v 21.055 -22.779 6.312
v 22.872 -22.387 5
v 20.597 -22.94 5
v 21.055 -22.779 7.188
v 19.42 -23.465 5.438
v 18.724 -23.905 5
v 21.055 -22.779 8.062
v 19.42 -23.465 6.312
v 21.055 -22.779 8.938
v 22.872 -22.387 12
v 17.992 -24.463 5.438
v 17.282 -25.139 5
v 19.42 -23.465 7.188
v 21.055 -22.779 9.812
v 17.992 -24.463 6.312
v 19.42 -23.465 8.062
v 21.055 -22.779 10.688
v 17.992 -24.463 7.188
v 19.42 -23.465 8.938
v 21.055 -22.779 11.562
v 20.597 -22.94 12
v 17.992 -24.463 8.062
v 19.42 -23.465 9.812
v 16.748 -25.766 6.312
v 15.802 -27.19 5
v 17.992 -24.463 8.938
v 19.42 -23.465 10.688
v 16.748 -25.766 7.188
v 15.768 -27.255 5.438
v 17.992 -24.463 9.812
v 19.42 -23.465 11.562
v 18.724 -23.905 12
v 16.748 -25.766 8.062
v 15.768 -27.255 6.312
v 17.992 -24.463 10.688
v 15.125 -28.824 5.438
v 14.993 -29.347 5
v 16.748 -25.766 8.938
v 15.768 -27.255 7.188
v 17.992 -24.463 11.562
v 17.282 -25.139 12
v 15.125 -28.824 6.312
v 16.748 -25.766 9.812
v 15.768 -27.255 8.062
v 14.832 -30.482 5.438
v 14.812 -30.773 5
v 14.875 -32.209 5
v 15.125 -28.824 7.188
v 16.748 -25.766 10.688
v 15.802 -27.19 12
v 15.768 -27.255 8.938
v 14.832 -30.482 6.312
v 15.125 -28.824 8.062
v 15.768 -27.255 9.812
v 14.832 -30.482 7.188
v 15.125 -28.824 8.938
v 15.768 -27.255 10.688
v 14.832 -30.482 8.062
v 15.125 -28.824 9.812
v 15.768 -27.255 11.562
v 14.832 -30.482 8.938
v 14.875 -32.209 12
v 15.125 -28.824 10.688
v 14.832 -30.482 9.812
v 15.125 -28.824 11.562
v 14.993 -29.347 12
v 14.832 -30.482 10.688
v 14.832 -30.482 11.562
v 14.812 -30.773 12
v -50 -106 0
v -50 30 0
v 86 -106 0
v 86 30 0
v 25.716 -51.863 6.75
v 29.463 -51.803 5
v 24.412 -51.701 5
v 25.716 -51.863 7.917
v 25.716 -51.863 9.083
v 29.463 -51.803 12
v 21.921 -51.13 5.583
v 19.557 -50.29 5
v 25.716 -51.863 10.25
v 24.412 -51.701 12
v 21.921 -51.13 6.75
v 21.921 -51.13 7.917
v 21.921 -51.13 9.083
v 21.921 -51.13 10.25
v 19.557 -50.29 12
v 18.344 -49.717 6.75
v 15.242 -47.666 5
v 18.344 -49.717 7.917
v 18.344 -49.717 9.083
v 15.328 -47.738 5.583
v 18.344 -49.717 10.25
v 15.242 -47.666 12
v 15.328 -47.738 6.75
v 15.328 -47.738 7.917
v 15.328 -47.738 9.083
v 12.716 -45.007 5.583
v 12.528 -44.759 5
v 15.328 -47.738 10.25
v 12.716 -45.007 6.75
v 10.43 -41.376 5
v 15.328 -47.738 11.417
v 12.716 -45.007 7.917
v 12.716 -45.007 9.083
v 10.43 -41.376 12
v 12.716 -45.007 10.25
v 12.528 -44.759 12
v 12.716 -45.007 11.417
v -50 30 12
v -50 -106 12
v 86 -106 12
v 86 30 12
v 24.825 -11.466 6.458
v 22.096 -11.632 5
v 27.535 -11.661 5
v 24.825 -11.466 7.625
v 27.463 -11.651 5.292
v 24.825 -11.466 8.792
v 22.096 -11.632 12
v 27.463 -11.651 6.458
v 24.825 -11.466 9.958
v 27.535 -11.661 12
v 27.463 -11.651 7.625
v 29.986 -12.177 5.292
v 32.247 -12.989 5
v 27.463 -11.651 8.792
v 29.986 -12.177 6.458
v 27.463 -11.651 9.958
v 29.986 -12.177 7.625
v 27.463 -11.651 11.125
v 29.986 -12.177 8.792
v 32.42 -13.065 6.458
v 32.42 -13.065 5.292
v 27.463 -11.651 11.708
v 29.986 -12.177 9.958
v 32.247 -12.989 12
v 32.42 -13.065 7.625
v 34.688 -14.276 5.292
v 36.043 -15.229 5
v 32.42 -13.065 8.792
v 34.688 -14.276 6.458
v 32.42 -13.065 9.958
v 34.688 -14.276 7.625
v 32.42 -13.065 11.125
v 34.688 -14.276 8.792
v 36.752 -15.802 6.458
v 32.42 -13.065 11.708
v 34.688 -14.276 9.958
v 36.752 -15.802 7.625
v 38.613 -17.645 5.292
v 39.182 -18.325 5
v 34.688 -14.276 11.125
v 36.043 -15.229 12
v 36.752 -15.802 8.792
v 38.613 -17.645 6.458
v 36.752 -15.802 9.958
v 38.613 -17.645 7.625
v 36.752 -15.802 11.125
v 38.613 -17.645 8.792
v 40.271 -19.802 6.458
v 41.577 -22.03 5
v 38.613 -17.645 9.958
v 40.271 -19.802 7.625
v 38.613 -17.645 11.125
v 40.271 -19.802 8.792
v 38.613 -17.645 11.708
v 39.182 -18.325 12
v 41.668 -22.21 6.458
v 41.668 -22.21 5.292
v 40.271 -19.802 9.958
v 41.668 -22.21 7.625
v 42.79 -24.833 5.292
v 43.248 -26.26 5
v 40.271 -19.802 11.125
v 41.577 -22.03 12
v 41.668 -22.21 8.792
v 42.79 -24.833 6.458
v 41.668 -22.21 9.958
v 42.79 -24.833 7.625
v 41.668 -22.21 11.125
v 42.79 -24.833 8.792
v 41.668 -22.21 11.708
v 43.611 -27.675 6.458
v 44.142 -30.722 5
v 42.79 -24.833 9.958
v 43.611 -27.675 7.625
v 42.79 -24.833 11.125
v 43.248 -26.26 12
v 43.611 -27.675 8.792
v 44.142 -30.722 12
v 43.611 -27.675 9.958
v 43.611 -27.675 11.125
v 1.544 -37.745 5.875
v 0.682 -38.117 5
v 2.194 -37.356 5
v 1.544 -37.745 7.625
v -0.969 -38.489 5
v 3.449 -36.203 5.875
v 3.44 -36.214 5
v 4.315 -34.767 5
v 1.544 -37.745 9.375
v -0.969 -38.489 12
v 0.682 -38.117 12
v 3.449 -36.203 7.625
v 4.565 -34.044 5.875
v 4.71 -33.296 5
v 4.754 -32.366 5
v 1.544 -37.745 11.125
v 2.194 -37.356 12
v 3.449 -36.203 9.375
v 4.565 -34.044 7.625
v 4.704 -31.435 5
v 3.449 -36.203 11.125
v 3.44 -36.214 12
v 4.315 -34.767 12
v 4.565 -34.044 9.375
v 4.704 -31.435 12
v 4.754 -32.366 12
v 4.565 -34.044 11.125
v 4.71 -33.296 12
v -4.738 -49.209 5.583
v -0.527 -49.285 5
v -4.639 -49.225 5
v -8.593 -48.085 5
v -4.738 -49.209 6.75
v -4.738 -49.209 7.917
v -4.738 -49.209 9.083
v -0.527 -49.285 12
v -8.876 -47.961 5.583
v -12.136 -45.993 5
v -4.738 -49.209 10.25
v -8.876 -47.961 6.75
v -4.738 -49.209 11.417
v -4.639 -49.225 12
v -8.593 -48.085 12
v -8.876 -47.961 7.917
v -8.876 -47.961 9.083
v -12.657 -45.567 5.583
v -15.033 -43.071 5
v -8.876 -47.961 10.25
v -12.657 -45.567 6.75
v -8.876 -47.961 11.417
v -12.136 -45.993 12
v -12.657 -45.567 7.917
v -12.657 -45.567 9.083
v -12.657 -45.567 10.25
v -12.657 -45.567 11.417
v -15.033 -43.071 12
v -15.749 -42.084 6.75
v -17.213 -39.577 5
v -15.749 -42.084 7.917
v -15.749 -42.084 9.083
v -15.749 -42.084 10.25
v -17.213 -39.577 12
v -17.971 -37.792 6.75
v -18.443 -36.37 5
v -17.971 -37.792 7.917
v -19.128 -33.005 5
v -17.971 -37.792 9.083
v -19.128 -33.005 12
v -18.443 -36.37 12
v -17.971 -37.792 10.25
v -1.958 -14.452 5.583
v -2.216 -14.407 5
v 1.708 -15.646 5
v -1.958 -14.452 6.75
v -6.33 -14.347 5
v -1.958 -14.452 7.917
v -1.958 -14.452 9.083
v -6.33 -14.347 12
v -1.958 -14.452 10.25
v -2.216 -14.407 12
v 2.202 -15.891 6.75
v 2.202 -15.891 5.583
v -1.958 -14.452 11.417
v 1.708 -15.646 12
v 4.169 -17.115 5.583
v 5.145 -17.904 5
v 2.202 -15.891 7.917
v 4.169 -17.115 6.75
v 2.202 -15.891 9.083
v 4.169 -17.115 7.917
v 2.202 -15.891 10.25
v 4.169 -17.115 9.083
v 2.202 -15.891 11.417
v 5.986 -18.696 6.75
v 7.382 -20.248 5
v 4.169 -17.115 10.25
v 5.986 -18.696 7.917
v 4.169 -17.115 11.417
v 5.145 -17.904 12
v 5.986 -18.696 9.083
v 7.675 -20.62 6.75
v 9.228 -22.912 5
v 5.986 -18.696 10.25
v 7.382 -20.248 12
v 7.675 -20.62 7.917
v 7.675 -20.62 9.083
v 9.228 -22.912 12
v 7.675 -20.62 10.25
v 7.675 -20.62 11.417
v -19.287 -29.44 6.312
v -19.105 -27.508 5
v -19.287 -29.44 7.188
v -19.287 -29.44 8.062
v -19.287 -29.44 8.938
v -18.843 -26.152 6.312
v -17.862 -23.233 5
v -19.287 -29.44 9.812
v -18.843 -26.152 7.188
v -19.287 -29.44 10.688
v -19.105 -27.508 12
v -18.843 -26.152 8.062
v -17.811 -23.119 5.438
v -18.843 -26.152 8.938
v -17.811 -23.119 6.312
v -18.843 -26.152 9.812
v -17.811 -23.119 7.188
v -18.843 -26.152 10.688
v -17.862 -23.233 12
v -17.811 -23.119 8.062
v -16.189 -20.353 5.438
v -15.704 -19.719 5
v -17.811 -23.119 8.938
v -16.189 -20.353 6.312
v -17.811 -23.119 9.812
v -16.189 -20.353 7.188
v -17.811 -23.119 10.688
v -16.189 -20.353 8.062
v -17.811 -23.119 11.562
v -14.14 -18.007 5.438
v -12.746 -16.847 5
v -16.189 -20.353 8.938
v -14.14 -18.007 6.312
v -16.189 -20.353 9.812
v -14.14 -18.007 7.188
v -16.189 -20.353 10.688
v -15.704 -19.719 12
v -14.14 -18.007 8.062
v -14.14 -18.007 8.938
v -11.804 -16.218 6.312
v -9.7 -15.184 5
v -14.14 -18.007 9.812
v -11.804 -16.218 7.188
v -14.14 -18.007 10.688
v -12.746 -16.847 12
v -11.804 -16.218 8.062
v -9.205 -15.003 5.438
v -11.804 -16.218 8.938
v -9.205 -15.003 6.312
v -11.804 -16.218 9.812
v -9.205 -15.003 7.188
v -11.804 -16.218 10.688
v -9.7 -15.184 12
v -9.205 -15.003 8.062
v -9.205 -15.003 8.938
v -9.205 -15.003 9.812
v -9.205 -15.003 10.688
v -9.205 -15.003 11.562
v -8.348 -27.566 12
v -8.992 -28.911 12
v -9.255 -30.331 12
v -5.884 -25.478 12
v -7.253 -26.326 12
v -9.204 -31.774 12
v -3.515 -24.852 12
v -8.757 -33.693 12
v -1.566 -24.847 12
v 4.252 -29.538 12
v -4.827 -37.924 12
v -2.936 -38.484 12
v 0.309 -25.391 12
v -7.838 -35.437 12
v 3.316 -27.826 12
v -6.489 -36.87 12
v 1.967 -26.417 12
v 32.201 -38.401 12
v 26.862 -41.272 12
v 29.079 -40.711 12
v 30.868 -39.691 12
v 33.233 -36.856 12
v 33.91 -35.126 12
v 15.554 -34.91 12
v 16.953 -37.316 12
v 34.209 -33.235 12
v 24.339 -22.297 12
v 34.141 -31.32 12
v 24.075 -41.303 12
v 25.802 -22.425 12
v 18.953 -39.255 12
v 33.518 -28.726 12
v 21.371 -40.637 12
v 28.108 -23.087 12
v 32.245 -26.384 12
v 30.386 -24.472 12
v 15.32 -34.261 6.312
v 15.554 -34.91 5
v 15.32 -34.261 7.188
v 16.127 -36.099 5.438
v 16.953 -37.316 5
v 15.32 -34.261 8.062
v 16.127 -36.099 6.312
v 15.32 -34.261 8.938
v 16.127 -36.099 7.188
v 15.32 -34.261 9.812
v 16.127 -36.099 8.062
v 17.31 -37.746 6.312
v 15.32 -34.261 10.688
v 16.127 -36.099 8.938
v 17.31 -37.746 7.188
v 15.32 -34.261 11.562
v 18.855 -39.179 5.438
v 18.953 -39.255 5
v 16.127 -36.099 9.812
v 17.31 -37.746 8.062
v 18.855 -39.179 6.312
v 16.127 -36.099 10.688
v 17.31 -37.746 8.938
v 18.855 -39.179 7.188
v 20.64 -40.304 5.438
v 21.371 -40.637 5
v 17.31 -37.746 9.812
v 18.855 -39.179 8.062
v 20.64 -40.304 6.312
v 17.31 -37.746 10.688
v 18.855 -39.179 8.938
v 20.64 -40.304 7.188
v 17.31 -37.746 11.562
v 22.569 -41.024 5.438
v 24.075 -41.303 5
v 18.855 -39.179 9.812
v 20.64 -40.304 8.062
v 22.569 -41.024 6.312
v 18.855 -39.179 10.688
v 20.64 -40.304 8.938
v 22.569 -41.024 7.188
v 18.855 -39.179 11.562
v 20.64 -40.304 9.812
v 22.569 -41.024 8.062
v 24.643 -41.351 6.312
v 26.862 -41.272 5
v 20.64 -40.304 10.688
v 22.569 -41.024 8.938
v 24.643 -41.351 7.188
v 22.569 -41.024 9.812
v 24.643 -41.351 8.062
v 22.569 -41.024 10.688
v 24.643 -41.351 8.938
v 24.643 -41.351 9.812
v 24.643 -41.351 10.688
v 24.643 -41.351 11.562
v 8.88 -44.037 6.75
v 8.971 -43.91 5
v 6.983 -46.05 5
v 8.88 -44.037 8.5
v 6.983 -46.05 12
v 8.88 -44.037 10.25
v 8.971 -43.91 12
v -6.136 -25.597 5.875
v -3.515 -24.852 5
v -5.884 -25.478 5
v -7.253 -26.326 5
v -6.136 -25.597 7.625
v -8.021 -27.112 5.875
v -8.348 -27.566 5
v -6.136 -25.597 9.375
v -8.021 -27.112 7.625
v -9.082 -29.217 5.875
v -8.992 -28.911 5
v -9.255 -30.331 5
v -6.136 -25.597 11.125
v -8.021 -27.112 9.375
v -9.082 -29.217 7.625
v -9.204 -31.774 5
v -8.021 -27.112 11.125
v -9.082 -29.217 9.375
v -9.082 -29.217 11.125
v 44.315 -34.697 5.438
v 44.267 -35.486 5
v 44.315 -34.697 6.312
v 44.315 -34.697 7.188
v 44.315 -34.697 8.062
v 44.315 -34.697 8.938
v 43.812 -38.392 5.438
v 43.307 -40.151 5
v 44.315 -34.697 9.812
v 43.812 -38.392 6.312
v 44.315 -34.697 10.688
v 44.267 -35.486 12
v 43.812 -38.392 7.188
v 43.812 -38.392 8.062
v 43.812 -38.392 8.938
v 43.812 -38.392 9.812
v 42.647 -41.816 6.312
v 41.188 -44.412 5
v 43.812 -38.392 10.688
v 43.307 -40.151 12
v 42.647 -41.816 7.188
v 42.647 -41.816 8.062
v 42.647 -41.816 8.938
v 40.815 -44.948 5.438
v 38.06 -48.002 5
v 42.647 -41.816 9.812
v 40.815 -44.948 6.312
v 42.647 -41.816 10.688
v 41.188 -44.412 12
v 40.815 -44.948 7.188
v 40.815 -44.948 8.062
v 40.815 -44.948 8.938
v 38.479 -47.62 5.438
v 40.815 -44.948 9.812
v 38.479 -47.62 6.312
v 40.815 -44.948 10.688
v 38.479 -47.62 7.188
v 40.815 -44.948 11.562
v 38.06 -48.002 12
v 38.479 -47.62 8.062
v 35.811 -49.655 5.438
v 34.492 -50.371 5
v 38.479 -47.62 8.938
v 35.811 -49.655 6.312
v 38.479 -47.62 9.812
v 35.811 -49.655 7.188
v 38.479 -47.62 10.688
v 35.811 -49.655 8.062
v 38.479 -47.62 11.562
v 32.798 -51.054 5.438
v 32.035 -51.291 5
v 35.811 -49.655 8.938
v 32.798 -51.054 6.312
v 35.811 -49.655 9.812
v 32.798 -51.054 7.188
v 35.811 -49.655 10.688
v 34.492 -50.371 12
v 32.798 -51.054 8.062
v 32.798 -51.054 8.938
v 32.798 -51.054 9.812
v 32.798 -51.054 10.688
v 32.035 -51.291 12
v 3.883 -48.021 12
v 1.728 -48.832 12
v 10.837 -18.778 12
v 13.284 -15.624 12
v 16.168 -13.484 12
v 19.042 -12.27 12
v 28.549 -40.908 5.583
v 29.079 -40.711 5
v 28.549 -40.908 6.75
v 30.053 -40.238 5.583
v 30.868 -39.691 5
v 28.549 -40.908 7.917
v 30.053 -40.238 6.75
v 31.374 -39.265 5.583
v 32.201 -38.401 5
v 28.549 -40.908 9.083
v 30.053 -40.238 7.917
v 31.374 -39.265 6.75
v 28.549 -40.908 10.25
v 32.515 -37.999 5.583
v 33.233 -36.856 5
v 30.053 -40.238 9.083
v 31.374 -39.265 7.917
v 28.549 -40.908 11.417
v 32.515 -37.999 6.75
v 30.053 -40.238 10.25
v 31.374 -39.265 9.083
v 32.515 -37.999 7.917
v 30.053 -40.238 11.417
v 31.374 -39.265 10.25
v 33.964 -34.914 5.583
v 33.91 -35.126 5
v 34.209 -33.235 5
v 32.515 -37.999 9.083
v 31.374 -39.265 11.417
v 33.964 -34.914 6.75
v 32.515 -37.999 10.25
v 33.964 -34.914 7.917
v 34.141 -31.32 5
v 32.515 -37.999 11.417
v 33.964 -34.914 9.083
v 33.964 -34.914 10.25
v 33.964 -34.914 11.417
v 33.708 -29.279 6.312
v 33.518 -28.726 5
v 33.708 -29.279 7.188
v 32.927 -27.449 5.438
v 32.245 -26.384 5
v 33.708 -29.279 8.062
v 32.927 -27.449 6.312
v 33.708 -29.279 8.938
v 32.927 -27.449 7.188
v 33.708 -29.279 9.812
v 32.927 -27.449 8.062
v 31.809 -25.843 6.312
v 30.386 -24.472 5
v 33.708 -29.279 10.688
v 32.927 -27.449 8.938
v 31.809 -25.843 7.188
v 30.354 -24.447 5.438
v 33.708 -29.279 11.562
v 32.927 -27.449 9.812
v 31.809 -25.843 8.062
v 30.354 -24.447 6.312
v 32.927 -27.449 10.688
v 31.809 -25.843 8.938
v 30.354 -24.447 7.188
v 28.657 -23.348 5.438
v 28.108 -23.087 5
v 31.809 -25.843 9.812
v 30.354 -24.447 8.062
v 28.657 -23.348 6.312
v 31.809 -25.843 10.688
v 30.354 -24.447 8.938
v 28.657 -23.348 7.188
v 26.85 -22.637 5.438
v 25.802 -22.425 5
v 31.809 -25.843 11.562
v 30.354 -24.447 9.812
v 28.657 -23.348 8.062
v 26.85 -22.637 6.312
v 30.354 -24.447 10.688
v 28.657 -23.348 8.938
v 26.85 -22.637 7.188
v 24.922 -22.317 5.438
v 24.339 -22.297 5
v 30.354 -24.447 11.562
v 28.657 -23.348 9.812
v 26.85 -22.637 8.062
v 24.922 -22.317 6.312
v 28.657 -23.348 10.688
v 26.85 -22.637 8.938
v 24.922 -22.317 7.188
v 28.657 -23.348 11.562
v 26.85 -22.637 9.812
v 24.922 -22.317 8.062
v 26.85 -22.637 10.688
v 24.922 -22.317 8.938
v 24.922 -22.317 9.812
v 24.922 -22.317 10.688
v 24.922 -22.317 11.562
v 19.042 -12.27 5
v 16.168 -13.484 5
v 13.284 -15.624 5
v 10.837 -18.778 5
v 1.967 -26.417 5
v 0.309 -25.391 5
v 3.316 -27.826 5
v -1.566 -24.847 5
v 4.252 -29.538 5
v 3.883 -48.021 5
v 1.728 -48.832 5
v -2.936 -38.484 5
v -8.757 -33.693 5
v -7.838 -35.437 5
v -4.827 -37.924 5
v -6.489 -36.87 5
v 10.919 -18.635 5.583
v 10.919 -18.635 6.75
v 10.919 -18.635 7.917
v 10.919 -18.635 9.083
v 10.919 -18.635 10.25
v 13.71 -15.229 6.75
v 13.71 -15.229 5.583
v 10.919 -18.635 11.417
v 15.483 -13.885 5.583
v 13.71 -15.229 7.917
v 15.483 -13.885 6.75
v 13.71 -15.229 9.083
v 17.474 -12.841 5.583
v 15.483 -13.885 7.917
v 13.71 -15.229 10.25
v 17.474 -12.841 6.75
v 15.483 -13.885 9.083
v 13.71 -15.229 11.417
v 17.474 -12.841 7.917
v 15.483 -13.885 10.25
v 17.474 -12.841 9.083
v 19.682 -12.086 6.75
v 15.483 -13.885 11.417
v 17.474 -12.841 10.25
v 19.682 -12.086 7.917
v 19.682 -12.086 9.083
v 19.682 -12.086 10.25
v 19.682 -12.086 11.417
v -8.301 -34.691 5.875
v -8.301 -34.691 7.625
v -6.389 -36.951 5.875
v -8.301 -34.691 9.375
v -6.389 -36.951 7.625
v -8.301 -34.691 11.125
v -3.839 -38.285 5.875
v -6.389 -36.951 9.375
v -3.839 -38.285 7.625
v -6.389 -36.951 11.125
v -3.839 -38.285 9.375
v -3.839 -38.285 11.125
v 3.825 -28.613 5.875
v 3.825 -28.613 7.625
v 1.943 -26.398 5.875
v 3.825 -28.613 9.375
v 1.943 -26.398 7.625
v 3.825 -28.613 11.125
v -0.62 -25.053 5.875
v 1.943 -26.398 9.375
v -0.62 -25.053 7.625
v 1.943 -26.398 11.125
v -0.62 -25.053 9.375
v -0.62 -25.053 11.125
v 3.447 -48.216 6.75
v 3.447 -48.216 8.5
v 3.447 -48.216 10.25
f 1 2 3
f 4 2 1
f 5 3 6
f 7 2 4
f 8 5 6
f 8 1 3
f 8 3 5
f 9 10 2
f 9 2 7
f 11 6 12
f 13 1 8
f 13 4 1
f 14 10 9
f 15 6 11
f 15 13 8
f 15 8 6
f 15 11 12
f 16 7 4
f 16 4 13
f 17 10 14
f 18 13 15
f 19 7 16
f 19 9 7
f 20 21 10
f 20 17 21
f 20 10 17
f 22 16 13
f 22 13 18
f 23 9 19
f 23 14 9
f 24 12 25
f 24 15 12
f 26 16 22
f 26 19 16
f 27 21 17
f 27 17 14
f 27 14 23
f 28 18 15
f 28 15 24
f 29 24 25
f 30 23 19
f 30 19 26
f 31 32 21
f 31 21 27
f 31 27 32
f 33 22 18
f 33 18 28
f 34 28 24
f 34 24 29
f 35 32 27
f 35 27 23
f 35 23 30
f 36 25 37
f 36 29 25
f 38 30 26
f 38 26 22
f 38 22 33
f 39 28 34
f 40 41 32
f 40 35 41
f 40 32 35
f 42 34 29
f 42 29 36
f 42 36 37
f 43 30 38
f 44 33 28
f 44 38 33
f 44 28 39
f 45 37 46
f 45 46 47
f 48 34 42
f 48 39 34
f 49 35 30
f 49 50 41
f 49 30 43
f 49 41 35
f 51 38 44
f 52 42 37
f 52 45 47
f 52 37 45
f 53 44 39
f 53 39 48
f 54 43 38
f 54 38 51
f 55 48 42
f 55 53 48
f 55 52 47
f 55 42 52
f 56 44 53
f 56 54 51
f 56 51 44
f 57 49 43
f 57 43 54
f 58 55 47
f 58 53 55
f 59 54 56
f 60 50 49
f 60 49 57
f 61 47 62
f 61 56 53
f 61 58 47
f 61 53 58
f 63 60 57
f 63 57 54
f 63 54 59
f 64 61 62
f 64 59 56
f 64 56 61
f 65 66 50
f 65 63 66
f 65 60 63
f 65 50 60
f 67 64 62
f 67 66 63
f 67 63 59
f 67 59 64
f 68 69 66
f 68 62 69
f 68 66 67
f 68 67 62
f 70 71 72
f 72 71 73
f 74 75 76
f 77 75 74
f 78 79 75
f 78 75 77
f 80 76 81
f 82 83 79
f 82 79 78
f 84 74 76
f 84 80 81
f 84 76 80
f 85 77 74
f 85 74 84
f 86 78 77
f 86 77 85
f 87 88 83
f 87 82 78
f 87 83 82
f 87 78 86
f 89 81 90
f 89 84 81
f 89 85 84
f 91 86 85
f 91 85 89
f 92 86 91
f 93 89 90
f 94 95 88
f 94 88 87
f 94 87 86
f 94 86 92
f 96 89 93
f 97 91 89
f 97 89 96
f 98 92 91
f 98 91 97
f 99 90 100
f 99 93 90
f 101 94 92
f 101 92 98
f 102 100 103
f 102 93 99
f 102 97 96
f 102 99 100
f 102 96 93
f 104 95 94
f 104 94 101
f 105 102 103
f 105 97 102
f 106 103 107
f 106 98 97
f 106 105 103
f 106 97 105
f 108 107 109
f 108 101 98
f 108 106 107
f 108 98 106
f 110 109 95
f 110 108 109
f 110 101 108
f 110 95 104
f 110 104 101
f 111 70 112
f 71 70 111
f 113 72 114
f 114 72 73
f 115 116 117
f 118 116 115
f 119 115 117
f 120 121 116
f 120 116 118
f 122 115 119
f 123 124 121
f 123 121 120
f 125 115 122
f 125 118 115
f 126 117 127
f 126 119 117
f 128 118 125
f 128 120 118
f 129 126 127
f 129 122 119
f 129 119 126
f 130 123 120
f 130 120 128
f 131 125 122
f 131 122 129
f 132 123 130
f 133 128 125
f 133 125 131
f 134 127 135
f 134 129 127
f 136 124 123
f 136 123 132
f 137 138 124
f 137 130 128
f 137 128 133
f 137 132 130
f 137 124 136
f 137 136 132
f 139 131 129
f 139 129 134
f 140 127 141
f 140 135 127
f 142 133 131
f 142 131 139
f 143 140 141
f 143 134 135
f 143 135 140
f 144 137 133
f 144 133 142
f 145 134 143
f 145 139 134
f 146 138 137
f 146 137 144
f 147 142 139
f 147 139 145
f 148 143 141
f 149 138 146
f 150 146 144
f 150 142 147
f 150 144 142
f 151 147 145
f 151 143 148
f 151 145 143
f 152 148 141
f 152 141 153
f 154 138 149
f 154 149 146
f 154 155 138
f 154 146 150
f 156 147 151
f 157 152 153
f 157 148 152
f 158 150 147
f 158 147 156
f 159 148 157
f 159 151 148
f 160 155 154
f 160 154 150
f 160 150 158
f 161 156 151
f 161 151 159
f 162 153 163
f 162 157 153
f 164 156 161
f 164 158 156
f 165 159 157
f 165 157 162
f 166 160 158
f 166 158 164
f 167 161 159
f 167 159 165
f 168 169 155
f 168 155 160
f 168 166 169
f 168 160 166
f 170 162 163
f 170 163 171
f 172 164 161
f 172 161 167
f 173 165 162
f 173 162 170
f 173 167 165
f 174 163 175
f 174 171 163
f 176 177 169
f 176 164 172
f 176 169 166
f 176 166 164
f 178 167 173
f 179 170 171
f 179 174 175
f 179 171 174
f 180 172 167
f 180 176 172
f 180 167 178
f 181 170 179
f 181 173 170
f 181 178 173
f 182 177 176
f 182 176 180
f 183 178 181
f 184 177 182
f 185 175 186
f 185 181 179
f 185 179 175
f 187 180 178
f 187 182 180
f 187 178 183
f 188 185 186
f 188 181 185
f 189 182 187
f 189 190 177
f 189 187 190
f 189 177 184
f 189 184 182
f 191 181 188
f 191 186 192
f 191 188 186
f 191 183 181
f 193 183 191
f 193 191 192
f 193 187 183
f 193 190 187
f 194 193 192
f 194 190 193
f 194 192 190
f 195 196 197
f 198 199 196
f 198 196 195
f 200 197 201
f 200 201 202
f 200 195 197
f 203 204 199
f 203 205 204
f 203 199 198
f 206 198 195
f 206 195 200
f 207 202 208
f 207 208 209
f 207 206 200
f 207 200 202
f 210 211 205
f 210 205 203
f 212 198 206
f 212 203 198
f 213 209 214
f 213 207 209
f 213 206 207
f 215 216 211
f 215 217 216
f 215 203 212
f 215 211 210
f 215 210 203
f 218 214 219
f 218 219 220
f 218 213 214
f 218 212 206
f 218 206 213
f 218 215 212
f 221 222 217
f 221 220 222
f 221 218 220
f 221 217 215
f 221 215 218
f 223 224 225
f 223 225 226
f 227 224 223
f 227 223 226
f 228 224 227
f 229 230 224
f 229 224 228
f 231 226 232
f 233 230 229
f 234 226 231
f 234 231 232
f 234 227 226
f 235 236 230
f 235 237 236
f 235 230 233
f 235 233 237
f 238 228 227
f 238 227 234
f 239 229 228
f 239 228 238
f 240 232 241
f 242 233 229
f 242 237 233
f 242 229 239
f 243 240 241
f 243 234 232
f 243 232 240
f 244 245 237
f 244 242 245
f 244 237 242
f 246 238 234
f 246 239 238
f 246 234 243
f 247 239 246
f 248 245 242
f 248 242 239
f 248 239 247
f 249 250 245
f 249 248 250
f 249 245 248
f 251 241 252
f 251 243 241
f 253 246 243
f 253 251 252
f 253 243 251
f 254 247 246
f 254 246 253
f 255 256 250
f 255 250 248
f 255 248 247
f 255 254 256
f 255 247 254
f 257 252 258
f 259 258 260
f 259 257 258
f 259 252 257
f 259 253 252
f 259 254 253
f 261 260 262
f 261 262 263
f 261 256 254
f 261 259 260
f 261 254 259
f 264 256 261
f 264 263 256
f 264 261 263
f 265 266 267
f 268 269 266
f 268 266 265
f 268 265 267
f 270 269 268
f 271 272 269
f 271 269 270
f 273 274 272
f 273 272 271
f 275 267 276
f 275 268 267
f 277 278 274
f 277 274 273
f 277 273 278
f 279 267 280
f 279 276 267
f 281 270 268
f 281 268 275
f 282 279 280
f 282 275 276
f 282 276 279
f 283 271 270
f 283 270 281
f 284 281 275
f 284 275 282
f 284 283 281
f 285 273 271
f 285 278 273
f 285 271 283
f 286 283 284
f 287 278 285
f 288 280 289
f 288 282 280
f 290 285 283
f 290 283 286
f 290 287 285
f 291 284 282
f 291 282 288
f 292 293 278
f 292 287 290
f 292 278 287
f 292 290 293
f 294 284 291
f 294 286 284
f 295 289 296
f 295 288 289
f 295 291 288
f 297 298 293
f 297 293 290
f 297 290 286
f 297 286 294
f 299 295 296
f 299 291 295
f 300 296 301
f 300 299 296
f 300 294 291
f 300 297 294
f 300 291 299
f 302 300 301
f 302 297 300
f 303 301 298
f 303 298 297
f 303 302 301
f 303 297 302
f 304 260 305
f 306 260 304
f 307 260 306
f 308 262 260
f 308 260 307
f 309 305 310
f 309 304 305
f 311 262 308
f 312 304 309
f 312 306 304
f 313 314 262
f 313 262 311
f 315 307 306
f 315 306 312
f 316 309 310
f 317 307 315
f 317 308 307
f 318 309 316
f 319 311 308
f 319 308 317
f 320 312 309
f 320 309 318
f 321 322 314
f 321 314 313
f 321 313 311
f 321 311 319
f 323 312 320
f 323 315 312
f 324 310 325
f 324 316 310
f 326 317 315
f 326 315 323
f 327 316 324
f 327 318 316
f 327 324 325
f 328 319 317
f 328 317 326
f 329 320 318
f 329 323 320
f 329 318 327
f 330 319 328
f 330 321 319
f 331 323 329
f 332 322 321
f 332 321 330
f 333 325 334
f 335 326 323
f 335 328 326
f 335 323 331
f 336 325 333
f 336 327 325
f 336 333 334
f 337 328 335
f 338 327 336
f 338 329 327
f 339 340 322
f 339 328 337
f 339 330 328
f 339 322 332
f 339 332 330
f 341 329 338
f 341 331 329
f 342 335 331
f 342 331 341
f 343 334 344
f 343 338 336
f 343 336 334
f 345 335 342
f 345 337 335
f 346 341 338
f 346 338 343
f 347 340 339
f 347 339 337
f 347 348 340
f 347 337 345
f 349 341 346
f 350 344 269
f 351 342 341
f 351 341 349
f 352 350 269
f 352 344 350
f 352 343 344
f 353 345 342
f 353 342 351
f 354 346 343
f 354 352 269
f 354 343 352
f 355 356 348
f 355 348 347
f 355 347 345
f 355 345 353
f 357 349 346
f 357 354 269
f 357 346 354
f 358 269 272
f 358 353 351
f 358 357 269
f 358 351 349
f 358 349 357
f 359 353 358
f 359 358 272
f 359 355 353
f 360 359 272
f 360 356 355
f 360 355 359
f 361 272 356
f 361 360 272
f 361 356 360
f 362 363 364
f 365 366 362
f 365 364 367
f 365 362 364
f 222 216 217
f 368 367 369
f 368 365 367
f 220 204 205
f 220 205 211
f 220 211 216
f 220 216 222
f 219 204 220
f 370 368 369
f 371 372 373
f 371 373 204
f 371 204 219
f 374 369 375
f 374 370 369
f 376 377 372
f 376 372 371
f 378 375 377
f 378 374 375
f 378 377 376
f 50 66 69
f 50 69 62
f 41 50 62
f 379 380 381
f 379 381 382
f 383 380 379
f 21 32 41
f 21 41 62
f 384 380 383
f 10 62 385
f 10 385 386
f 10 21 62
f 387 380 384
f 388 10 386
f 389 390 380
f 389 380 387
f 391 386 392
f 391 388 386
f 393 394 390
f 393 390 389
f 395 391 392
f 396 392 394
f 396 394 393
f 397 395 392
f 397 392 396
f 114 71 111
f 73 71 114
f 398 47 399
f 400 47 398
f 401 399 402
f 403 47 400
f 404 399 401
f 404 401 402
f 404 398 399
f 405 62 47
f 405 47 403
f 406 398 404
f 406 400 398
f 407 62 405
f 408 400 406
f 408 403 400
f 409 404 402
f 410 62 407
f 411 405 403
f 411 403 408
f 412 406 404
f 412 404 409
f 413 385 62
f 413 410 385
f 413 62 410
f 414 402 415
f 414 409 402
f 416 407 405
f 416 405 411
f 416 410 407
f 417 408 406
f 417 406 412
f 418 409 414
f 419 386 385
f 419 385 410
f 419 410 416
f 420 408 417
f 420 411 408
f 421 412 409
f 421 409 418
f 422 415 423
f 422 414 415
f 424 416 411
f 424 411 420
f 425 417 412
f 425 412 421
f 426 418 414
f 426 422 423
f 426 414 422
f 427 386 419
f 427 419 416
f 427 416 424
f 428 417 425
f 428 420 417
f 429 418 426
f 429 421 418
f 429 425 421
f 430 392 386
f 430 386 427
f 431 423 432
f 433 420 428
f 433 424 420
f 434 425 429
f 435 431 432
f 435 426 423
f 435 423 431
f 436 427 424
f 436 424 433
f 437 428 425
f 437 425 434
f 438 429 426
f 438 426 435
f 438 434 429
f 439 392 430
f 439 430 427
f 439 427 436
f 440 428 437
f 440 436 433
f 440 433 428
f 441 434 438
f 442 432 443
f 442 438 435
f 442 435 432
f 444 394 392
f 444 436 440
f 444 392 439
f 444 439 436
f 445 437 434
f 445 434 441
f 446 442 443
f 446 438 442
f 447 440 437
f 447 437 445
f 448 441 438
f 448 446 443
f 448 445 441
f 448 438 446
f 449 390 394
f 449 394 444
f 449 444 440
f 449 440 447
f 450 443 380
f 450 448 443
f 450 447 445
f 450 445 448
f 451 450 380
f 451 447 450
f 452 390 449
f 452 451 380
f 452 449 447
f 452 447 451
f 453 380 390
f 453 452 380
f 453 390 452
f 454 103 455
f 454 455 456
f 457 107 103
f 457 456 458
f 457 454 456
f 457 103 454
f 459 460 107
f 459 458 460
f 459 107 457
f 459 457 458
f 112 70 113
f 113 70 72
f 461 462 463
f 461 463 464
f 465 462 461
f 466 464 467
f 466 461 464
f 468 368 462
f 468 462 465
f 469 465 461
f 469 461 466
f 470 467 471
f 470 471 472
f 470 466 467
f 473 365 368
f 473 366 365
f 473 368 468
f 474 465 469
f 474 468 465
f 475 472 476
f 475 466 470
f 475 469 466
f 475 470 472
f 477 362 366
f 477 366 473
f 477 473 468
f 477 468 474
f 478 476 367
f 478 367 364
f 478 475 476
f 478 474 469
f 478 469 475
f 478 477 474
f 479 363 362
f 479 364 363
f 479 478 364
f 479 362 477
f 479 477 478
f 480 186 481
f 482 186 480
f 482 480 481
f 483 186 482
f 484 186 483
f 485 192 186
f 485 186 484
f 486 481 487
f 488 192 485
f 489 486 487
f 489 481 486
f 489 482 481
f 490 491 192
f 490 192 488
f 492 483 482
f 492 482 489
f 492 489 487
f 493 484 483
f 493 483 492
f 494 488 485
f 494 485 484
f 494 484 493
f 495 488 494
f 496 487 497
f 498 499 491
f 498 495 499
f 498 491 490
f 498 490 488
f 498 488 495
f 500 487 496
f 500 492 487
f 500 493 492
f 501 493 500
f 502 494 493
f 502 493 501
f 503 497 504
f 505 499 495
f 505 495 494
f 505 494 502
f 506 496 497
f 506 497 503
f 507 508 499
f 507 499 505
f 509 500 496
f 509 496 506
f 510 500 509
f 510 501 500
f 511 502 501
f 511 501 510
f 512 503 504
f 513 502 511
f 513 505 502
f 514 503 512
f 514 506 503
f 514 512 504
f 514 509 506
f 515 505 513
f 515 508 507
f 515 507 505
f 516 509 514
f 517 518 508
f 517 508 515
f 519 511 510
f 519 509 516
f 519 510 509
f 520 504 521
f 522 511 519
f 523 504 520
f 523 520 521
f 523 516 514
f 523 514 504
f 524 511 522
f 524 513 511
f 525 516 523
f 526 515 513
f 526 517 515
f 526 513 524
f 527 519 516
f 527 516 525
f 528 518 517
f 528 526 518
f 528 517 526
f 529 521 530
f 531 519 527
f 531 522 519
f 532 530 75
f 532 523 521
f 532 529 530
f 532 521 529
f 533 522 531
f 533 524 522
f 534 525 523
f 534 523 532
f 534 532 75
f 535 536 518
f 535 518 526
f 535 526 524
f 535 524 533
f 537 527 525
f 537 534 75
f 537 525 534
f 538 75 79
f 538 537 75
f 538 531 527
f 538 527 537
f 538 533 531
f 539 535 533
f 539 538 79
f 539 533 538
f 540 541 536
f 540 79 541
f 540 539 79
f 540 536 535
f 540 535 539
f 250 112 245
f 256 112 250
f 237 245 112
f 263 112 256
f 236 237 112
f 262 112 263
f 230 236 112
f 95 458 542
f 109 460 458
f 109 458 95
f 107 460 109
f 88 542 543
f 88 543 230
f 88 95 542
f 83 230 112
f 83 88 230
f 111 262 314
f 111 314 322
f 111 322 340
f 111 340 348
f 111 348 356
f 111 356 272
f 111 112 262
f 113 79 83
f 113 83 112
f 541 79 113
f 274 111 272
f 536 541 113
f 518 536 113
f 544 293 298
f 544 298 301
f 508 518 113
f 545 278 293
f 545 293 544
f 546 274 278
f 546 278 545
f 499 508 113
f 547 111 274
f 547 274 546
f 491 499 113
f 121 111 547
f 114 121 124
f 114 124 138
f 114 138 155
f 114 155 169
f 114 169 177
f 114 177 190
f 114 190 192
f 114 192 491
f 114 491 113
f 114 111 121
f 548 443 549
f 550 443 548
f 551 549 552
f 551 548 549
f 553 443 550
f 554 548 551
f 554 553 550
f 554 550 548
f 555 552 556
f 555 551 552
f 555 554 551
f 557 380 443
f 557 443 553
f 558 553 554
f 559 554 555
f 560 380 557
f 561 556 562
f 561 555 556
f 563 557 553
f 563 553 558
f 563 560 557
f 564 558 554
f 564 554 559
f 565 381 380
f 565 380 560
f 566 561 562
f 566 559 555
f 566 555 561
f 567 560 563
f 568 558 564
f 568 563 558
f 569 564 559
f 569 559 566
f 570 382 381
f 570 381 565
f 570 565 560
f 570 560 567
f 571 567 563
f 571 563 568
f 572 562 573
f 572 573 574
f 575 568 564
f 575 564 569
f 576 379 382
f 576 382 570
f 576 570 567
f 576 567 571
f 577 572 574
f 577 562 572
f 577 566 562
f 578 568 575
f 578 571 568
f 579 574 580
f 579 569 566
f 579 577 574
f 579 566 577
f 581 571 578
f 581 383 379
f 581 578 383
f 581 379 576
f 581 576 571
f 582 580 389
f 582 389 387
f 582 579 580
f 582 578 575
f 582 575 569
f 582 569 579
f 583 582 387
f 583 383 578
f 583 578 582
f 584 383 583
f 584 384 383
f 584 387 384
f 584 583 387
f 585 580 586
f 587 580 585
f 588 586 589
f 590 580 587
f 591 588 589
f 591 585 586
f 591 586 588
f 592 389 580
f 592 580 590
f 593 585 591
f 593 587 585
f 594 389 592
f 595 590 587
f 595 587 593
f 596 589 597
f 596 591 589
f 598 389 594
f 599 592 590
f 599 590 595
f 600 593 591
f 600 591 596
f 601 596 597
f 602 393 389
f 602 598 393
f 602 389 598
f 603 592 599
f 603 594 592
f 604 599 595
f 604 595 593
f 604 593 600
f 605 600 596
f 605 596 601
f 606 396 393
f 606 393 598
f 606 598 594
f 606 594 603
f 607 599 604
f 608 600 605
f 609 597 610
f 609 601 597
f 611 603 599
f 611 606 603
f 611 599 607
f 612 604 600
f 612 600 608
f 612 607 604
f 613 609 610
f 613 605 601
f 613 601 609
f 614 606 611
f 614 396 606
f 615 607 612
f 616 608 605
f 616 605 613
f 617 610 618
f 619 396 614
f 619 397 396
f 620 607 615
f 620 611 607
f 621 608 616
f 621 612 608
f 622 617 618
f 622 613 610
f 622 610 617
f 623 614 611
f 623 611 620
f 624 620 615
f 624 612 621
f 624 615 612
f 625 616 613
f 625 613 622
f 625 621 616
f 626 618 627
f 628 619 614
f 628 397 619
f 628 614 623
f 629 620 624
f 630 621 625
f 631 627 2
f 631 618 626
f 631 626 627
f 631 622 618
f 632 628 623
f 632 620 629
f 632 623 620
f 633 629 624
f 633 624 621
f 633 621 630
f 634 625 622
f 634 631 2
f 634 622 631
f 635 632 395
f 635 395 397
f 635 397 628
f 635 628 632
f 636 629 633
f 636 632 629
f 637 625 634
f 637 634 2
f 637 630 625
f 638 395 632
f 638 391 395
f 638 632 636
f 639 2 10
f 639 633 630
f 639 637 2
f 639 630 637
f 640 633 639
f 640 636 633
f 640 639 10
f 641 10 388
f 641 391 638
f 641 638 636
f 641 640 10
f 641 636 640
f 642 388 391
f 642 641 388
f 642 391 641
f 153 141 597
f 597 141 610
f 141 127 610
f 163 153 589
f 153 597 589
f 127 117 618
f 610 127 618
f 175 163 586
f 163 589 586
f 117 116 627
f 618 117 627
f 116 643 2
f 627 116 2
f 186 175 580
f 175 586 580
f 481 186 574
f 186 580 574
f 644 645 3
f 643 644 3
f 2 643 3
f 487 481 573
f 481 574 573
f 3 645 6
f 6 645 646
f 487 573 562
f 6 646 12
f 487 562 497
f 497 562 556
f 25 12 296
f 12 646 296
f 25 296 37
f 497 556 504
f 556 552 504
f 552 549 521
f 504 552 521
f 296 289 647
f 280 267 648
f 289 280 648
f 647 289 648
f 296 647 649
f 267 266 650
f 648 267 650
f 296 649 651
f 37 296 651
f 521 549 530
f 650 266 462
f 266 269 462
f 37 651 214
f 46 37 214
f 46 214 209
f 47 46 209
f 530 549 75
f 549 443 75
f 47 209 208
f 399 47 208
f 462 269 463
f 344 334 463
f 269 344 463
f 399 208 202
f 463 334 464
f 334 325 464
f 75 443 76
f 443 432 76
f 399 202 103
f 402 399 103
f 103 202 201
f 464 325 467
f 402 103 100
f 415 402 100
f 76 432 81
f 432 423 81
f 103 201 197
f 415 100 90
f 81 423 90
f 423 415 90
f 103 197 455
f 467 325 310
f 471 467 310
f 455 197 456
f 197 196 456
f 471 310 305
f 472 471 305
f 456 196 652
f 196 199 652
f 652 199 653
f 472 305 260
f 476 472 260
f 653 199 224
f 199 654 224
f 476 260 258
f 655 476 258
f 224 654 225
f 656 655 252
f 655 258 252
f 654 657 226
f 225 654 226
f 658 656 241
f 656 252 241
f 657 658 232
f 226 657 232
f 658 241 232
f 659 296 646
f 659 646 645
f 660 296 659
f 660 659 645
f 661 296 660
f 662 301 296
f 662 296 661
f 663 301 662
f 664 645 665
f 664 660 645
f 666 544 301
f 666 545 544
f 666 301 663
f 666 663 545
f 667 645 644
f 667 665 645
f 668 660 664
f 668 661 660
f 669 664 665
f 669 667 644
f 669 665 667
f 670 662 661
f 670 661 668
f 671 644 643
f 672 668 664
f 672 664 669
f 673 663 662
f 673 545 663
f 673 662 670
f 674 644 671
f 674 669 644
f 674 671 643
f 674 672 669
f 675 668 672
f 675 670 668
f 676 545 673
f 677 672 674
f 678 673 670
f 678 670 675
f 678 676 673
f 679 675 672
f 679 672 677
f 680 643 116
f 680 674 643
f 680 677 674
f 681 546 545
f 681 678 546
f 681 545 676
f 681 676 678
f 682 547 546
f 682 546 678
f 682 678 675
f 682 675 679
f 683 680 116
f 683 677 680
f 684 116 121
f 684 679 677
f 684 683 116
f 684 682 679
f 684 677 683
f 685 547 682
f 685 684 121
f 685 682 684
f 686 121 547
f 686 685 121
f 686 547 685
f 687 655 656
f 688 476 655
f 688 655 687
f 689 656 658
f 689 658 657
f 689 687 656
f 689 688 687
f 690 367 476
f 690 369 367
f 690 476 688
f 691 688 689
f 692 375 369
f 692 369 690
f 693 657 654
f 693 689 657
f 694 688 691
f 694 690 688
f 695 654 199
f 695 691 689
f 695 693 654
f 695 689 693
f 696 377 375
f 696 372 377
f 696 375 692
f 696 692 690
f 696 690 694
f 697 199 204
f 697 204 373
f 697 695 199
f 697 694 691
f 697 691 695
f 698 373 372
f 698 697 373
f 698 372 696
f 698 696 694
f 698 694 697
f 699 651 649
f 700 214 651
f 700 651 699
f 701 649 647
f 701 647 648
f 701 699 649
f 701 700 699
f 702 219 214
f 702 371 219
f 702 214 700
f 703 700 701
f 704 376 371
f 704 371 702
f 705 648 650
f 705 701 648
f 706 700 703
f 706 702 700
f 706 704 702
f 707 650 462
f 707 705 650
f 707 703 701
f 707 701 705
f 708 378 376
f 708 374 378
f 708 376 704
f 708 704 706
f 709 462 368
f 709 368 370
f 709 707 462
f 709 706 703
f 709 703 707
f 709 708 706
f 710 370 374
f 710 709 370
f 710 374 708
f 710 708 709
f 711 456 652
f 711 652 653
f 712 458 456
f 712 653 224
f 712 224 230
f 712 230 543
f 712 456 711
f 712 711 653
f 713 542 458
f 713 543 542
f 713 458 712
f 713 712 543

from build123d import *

# Parameters (mm, degrees)
SKIZZE1_W                       = 136
SKIZZE1_H                       = 136
AUFSATZ_LINEAR_AUSTRAGEN1_DEPTH = 12
SCHNITT_LINEAR_AUSTRAGEN2_DEPTH = 7


with BuildPart() as part:
    # Skizze1 → Aufsatz-Linear austragen1 (new body)
    with BuildSketch(Plane.XY):
        with Locations((18, -38)):
            Rectangle(SKIZZE1_W, SKIZZE1_H)
    extrude(amount=AUFSATZ_LINEAR_AUSTRAGEN1_DEPTH)

    # Skizze2 → Schnitt-Linear austragen2 (cut)
    with BuildSketch(Plane(origin=(31.817178146, 33.536064215, 12), x_dir=(-0.121869343, 0.992546152, 0), z_dir=(0, 0, 1))):
        with BuildLine():
            add(Edge.make_bspline(
                [(-53.274003062, 29.299786841), (-52.549854037, 28.997029862), (-51.129325688, 28.403126042), (-49.217358679, 27.153857855), (-47.540898563, 25.676342761), (-46.383253592, 24.230129356), (-45.579392411, 22.986547621), (-45.060203572, 21.996870887), (-44.632569988, 20.959918203), (-44.264434, 19.886493576), (-43.993212362, 18.762770223), (-43.787214797, 17.599258828), (-43.663882177, 16.389802125), (-43.652426375, 15.570103704), (-43.646599216, 15.153152225)],
                knots=[0, 0, 0, 0, 1.541464985, 3.0238178, 4.469784276, 5.921154489, 6.651437481, 7.38125241, 8.116115087, 8.856410813, 9.611538438, 10.387763072, 11.179912327, 12, 12, 12, 12], degree=3))
            add(Edge.make_bspline(
                [(-43.646599216, 15.153152225), (-43.650934028, 14.691984843), (-43.659509441, 13.779673016), (-43.806624249, 12.42868072), (-43.996415085, 11.108137934), (-44.308124238, 9.830927438), (-44.67636284, 8.587963111), (-45.135088006, 7.377098838), (-45.689116874, 6.208146216), (-46.311698148, 5.070923482), (-47.023881325, 3.99679881), (-47.791091102, 2.963169428), (-48.649851657, 2.008814583), (-49.564217558, 1.095396539), (-50.565090055, 0.262097691), (-51.626733483, -0.529779066), (-52.769329329, -1.242961105), (-53.9700016, -1.907524654), (-55.227178587, -2.493269476), (-56.533265143, -2.999356359), (-57.882028006, -3.431682546), (-59.277289658, -3.794809881), (-60.718920323, -4.070090999), (-62.204444332, -4.257904021), (-63.72850672, -4.385263221), (-64.760116786, -4.396473554), (-65.2812146, -4.402136236)],
                knots=[0, 0, 0, 0, 1.013897126, 2.005758377, 2.986752608, 3.946615008, 4.894629566, 5.837467942, 6.791608008, 7.738392708, 8.686857814, 9.624615693, 10.567330481, 11.508395868, 12.4653405, 13.429562997, 14.419856707, 15.425715908, 16.446941402, 17.468242957, 18.505094008, 19.561096764, 20.637967774, 21.731161366, 22.853940174, 24, 24, 24, 24], degree=3))
            add(Edge.make_bspline(
                [(-65.2812146, -4.402136236), (-65.958882909, -4.384472392), (-67.286063628, -4.349878605), (-69.234310849, -4.122595392), (-71.088778804, -3.725677952), (-72.855718687, -3.170705103), (-74.534480878, -2.458616989), (-76.126377078, -1.59186708), (-77.62546562, -0.565633337), (-79.007292948, 0.613232811), (-80.279643814, 1.880933964), (-81.37330296, 3.252409198), (-82.323408368, 4.667792163), (-83.081765939, 6.164635184), (-83.691564724, 7.71525695), (-84.107234052, 9.338475128), (-84.36939561, 11.017975802), (-84.400222214, 12.159382785), (-84.415829985, 12.737286841)],
                knots=[0, 0, 0, 0, 1.135997289, 2.224795934, 3.282557984, 4.310628835, 5.324785004, 6.334617724, 7.344294097, 8.364171613, 9.375722553, 10.350138575, 11.300131138, 12.228268618, 13.157450381, 14.08760252, 15.031736902, 16, 16, 16, 16], degree=3))
            add(Edge.make_bspline(
                [(-84.415829985, 12.737286841), (-84.398141873, 13.359514248), (-84.362560867, 14.611172777), (-84.046108264, 16.475278619), (-83.553289979, 18.332862908), (-82.85312214, 20.149856941), (-82.017226301, 21.902111555), (-81.027210856, 23.519078393), (-79.917924395, 24.982656379), (-78.672225452, 26.309139367), (-77.241589619, 27.499322426), (-75.614643729, 28.579625697), (-73.767611883, 29.54881074), (-72.437994582, 30.081084152), (-71.747560754, 30.357479148)],
                knots=[0, 0, 0, 0, 0.966358808, 1.943905445, 2.930138045, 3.948911318, 4.965341682, 5.943482994, 6.889898855, 7.81483236, 8.765090803, 9.775304409, 10.844776544, 12, 12, 12, 12], degree=3))
            add(Edge.make_bspline(
                [(-71.747560754, 30.357479148), (-72.190721524, 30.64916288), (-73.049869939, 31.21464528), (-74.198295254, 32.185447077), (-75.188865659, 33.212349202), (-75.711488475, 33.97567747), (-75.966310754, 34.347863764)],
                knots=[0, 0, 0, 0, 1.086599153, 2.106571708, 3.076795543, 4, 4, 4, 4], degree=3))
            add(Edge.make_bspline(
                [(-75.966310754, 34.347863764), (-76.323165999, 34.955072604), (-77.026932898, 36.152570718), (-77.722795567, 38.108141332), (-78.183557617, 40.123534227), (-78.235661796, 41.500702427), (-78.261983831, 42.196421456)],
                knots=[0, 0, 0, 0, 1.01806741, 2.007766889, 2.993561943, 4, 4, 4, 4], degree=3))
            add(Edge.make_bspline(
                [(-78.261983831, 42.196421456), (-78.23537461, 42.899971663), (-78.182076723, 44.309172574), (-77.713813486, 46.382422626), (-76.98599469, 48.408961783), (-75.963831699, 50.35796208), (-74.679088677, 52.192340379), (-73.1141166, 53.832767013), (-71.311800914, 55.27680529), (-69.26532957, 56.470788107), (-67.067165132, 57.465332003), (-64.736515258, 58.152022532), (-62.317145024, 58.593943299), (-60.671791448, 58.647564987), (-59.836503062, 58.674786841)],
                knots=[0, 0, 0, 0, 0.920470165, 1.843688453, 2.76992918, 3.734585969, 4.717327891, 5.693547554, 6.694185358, 7.731825961, 8.788908859, 9.846421484, 10.906703612, 12, 12, 12, 12], degree=3))
            add(Edge.make_bspline(
                [(-59.836503062, 58.674786841), (-59.230982927, 58.660259621), (-58.040482085, 58.63169795), (-56.29829286, 58.427393175), (-54.639261562, 58.081149502), (-53.069185983, 57.580466848), (-51.57240866, 56.964326646), (-50.17144743, 56.179926487), (-48.840427099, 55.284798301), (-47.625062234, 54.234512576), (-46.51940804, 53.108549537), (-45.544104678, 51.921381805), (-44.721799141, 50.677089491), (-44.047594914, 49.380403728), (-43.523480515, 48.029943504), (-43.154546402, 46.631027002), (-42.914252151, 45.181451885), (-42.889751129, 44.19657612), (-42.877368446, 43.698825302)],
                knots=[0, 0, 0, 0, 1.153096654, 2.26707992, 3.335605646, 4.375719133, 5.401714499, 6.412617512, 7.428490256, 8.451445124, 9.465855333, 10.431151224, 11.372908333, 12.301184165, 13.209487923, 14.12567389, 15.05272585, 16, 16, 16, 16], degree=3))
            add(Edge.make_bspline(
                [(-42.877368446, 43.698825302), (-42.905643962, 42.958950067), (-42.961586368, 41.495125281), (-43.463389482, 39.353175554), (-44.279012696, 37.308231587), (-45.223063581, 35.70248234), (-46.124653996, 34.47762788), (-46.898000859, 33.598462819), (-47.754048911, 32.766661016), (-48.698521395, 31.984937493), (-49.71790019, 31.242139238), (-50.818648115, 30.538084778), (-52.011488975, 29.891995585), (-52.847287007, 29.499946967), (-53.274003062, 29.299786841)],
                knots=[0, 0, 0, 0, 1.410602094, 2.790841224, 4.173979642, 5.599674553, 6.332295756, 7.074709729, 7.831826395, 8.608276812, 9.412839061, 10.238069433, 11.10044768, 12, 12, 12, 12], degree=3))
        make_face()
        with BuildLine():
            add(Edge.make_bspline(
                [(-59.824483831, 48.674786841), (-60.352516059, 48.652845307), (-61.377655752, 48.610247269), (-62.841578901, 48.176829263), (-64.179276715, 47.502792548), (-65.328034146, 46.544266315), (-66.298085013, 45.433090348), (-66.979481403, 44.156862114), (-67.428371825, 42.779160436), (-67.471044622, 41.81135706), (-67.492753062, 41.31901761)],
                knots=[0, 0, 0, 0, 1.068429257, 2.074284832, 3.070241312, 4.086972024, 5.090164471, 6.043007022, 7.004441531, 8, 8, 8, 8], degree=3))
            add(Edge.make_bspline(
                [(-67.492753062, 41.31901761), (-67.473929185, 40.864109489), (-67.437584116, 39.985774676), (-67.10130135, 38.732293616), (-66.555869581, 37.605825006), (-65.793957463, 36.626955052), (-64.85152003, 35.830710586), (-63.759665259, 35.234717657), (-62.512294914, 34.89677058), (-61.637404139, 34.851936614), (-61.182656908, 34.828632995)],
                knots=[0, 0, 0, 0, 1.072640992, 2.07105101, 3.040153855, 4.011148896, 4.977985479, 5.93481482, 6.926566298, 8, 8, 8, 8], degree=3))
            add(Edge.make_bspline(
                [(-61.182656908, 34.828632995), (-60.675198217, 34.852732592), (-59.683858844, 34.899812049), (-58.25660237, 35.309317711), (-56.964037268, 35.9996827), (-55.813856169, 36.92405734), (-54.852540828, 38.040749573), (-54.160091132, 39.316271312), (-53.708891249, 40.708196247), (-53.667713225, 41.684039252), (-53.646599216, 42.184402225)],
                knots=[0, 0, 0, 0, 1.037945009, 2.027664072, 3.011479609, 4.021405977, 5.034361915, 6.007613099, 6.978404693, 8, 8, 8, 8], degree=3))
            add(Edge.make_bspline(
                [(-53.646599216, 42.184402225), (-53.666798435, 42.658891111), (-53.705626475, 43.570979511), (-54.016462781, 44.86413864), (-54.553639658, 46.001166987), (-55.306058321, 46.957341882), (-56.231623271, 47.721425808), (-57.298628269, 48.291058685), (-58.519459621, 48.619028893), (-59.377778434, 48.655701083), (-59.824483831, 48.674786841)],
                knots=[0, 0, 0, 0, 1.125735341, 2.163949832, 3.13403846, 4.089322881, 5.028366283, 5.964514375, 6.940647228, 8, 8, 8, 8], degree=3))
        make_face(mode=Mode.SUBTRACT)
        with BuildLine():
            add(Edge.make_bspline(
                [(-63.189868446, 24.828632995), (-63.546958578, 24.819849725), (-64.248124359, 24.802603301), (-65.278687486, 24.65284738), (-66.26588341, 24.414922112), (-67.218030368, 24.074508741), (-68.124171376, 23.627691128), (-69.003132144, 23.096478873), (-69.826939518, 22.456502489), (-70.60548384, 21.735610071), (-71.325260982, 20.956120151), (-71.937654968, 20.102103173), (-72.475933951, 19.21637189), (-72.891806632, 18.266658625), (-73.23408407, 17.279544911), (-73.471791767, 16.239953845), (-73.620371311, 15.153463462), (-73.637753519, 14.412457228), (-73.646599216, 14.035363764)],
                knots=[0, 0, 0, 0, 1.022699828, 2.008126405, 2.97703308, 3.928371719, 4.898705406, 5.867340031, 6.866115651, 7.881574119, 8.905497311, 9.899710627, 10.88800813, 11.869414728, 12.86409184, 13.877666882, 14.919957873, 16, 16, 16, 16], degree=3))
            add(Edge.make_bspline(
                [(-73.646599216, 14.035363764), (-73.640730826, 13.742494084), (-73.629182877, 13.166178536), (-73.506274856, 12.319691722), (-73.299042285, 11.512101699), (-73.024438513, 10.736080079), (-72.661044756, 9.998176326), (-72.211928017, 9.301423414), (-71.69298417, 8.63354458), (-70.897386445, 7.811501758), (-69.765093278, 6.920074697), (-68.20602131, 6.153297916), (-66.48212127, 5.682850004), (-65.276239729, 5.626722634), (-64.6562146, 5.597863764)],
                knots=[0, 0, 0, 0, 0.765577671, 1.506520972, 2.230828579, 2.943445027, 3.655753251, 4.376641964, 5.10818981, 5.864097246, 7.364868711, 8.850381499, 10.380568448, 12, 12, 12, 12], degree=3))
            add(Edge.make_bspline(
                [(-64.6562146, 5.597863764), (-64.303276767, 5.60798212), (-63.606944844, 5.627945223), (-62.583729736, 5.759470932), (-61.600836455, 5.98873611), (-60.664613203, 6.315794911), (-59.766226508, 6.72225095), (-58.923393343, 7.236963036), (-58.111452735, 7.823213793), (-57.360485007, 8.510439488), (-56.670487949, 9.256542712), (-56.064396729, 10.052539505), (-55.557242701, 10.892031566), (-55.125912347, 11.768004638), (-54.829245921, 12.70010661), (-54.571654283, 13.654754893), (-54.446892724, 14.661094212), (-54.426319372, 15.345216002), (-54.415829985, 15.69401761)],
                knots=[0, 0, 0, 0, 1.056305773, 2.084048128, 3.08168982, 4.071445464, 5.04796526, 6.026838119, 7.02217112, 8.040920205, 9.067752774, 10.060626909, 11.029237137, 11.999997446, 12.974527425, 13.951709593, 14.95567281, 16, 16, 16, 16], degree=3))
            add(Edge.make_bspline(
                [(-54.415829985, 15.69401761), (-54.420212832, 16.011077436), (-54.428798095, 16.632144566), (-54.571380931, 17.540495533), (-54.778084438, 18.411484434), (-55.040943582, 19.254181447), (-55.431443296, 20.041285755), (-55.871685818, 20.803016633), (-56.400701962, 21.527217186), (-57.018595147, 22.18920949), (-57.663255138, 22.817132274), (-58.37114809, 23.341821526), (-59.092094086, 23.807956713), (-59.854804271, 24.181238548), (-60.648883729, 24.471086265), (-61.47193078, 24.670280394), (-62.319368408, 24.815697034), (-62.896756264, 24.824277236), (-63.189868446, 24.828632995)],
                knots=[0, 0, 0, 0, 1.079541345, 2.114640806, 3.124851578, 4.130993379, 5.114360147, 6.112033921, 7.128042352, 8.162330853, 9.195897967, 10.190014293, 11.159824633, 12.118612945, 13.077595717, 14.034729518, 15.002326226, 16, 16, 16, 16], degree=3))
        make_face(mode=Mode.SUBTRACT)
    extrude(amount=-SCHNITT_LINEAR_AUSTRAGEN2_DEPTH, mode=Mode.SUBTRACT)


solid = part.part
